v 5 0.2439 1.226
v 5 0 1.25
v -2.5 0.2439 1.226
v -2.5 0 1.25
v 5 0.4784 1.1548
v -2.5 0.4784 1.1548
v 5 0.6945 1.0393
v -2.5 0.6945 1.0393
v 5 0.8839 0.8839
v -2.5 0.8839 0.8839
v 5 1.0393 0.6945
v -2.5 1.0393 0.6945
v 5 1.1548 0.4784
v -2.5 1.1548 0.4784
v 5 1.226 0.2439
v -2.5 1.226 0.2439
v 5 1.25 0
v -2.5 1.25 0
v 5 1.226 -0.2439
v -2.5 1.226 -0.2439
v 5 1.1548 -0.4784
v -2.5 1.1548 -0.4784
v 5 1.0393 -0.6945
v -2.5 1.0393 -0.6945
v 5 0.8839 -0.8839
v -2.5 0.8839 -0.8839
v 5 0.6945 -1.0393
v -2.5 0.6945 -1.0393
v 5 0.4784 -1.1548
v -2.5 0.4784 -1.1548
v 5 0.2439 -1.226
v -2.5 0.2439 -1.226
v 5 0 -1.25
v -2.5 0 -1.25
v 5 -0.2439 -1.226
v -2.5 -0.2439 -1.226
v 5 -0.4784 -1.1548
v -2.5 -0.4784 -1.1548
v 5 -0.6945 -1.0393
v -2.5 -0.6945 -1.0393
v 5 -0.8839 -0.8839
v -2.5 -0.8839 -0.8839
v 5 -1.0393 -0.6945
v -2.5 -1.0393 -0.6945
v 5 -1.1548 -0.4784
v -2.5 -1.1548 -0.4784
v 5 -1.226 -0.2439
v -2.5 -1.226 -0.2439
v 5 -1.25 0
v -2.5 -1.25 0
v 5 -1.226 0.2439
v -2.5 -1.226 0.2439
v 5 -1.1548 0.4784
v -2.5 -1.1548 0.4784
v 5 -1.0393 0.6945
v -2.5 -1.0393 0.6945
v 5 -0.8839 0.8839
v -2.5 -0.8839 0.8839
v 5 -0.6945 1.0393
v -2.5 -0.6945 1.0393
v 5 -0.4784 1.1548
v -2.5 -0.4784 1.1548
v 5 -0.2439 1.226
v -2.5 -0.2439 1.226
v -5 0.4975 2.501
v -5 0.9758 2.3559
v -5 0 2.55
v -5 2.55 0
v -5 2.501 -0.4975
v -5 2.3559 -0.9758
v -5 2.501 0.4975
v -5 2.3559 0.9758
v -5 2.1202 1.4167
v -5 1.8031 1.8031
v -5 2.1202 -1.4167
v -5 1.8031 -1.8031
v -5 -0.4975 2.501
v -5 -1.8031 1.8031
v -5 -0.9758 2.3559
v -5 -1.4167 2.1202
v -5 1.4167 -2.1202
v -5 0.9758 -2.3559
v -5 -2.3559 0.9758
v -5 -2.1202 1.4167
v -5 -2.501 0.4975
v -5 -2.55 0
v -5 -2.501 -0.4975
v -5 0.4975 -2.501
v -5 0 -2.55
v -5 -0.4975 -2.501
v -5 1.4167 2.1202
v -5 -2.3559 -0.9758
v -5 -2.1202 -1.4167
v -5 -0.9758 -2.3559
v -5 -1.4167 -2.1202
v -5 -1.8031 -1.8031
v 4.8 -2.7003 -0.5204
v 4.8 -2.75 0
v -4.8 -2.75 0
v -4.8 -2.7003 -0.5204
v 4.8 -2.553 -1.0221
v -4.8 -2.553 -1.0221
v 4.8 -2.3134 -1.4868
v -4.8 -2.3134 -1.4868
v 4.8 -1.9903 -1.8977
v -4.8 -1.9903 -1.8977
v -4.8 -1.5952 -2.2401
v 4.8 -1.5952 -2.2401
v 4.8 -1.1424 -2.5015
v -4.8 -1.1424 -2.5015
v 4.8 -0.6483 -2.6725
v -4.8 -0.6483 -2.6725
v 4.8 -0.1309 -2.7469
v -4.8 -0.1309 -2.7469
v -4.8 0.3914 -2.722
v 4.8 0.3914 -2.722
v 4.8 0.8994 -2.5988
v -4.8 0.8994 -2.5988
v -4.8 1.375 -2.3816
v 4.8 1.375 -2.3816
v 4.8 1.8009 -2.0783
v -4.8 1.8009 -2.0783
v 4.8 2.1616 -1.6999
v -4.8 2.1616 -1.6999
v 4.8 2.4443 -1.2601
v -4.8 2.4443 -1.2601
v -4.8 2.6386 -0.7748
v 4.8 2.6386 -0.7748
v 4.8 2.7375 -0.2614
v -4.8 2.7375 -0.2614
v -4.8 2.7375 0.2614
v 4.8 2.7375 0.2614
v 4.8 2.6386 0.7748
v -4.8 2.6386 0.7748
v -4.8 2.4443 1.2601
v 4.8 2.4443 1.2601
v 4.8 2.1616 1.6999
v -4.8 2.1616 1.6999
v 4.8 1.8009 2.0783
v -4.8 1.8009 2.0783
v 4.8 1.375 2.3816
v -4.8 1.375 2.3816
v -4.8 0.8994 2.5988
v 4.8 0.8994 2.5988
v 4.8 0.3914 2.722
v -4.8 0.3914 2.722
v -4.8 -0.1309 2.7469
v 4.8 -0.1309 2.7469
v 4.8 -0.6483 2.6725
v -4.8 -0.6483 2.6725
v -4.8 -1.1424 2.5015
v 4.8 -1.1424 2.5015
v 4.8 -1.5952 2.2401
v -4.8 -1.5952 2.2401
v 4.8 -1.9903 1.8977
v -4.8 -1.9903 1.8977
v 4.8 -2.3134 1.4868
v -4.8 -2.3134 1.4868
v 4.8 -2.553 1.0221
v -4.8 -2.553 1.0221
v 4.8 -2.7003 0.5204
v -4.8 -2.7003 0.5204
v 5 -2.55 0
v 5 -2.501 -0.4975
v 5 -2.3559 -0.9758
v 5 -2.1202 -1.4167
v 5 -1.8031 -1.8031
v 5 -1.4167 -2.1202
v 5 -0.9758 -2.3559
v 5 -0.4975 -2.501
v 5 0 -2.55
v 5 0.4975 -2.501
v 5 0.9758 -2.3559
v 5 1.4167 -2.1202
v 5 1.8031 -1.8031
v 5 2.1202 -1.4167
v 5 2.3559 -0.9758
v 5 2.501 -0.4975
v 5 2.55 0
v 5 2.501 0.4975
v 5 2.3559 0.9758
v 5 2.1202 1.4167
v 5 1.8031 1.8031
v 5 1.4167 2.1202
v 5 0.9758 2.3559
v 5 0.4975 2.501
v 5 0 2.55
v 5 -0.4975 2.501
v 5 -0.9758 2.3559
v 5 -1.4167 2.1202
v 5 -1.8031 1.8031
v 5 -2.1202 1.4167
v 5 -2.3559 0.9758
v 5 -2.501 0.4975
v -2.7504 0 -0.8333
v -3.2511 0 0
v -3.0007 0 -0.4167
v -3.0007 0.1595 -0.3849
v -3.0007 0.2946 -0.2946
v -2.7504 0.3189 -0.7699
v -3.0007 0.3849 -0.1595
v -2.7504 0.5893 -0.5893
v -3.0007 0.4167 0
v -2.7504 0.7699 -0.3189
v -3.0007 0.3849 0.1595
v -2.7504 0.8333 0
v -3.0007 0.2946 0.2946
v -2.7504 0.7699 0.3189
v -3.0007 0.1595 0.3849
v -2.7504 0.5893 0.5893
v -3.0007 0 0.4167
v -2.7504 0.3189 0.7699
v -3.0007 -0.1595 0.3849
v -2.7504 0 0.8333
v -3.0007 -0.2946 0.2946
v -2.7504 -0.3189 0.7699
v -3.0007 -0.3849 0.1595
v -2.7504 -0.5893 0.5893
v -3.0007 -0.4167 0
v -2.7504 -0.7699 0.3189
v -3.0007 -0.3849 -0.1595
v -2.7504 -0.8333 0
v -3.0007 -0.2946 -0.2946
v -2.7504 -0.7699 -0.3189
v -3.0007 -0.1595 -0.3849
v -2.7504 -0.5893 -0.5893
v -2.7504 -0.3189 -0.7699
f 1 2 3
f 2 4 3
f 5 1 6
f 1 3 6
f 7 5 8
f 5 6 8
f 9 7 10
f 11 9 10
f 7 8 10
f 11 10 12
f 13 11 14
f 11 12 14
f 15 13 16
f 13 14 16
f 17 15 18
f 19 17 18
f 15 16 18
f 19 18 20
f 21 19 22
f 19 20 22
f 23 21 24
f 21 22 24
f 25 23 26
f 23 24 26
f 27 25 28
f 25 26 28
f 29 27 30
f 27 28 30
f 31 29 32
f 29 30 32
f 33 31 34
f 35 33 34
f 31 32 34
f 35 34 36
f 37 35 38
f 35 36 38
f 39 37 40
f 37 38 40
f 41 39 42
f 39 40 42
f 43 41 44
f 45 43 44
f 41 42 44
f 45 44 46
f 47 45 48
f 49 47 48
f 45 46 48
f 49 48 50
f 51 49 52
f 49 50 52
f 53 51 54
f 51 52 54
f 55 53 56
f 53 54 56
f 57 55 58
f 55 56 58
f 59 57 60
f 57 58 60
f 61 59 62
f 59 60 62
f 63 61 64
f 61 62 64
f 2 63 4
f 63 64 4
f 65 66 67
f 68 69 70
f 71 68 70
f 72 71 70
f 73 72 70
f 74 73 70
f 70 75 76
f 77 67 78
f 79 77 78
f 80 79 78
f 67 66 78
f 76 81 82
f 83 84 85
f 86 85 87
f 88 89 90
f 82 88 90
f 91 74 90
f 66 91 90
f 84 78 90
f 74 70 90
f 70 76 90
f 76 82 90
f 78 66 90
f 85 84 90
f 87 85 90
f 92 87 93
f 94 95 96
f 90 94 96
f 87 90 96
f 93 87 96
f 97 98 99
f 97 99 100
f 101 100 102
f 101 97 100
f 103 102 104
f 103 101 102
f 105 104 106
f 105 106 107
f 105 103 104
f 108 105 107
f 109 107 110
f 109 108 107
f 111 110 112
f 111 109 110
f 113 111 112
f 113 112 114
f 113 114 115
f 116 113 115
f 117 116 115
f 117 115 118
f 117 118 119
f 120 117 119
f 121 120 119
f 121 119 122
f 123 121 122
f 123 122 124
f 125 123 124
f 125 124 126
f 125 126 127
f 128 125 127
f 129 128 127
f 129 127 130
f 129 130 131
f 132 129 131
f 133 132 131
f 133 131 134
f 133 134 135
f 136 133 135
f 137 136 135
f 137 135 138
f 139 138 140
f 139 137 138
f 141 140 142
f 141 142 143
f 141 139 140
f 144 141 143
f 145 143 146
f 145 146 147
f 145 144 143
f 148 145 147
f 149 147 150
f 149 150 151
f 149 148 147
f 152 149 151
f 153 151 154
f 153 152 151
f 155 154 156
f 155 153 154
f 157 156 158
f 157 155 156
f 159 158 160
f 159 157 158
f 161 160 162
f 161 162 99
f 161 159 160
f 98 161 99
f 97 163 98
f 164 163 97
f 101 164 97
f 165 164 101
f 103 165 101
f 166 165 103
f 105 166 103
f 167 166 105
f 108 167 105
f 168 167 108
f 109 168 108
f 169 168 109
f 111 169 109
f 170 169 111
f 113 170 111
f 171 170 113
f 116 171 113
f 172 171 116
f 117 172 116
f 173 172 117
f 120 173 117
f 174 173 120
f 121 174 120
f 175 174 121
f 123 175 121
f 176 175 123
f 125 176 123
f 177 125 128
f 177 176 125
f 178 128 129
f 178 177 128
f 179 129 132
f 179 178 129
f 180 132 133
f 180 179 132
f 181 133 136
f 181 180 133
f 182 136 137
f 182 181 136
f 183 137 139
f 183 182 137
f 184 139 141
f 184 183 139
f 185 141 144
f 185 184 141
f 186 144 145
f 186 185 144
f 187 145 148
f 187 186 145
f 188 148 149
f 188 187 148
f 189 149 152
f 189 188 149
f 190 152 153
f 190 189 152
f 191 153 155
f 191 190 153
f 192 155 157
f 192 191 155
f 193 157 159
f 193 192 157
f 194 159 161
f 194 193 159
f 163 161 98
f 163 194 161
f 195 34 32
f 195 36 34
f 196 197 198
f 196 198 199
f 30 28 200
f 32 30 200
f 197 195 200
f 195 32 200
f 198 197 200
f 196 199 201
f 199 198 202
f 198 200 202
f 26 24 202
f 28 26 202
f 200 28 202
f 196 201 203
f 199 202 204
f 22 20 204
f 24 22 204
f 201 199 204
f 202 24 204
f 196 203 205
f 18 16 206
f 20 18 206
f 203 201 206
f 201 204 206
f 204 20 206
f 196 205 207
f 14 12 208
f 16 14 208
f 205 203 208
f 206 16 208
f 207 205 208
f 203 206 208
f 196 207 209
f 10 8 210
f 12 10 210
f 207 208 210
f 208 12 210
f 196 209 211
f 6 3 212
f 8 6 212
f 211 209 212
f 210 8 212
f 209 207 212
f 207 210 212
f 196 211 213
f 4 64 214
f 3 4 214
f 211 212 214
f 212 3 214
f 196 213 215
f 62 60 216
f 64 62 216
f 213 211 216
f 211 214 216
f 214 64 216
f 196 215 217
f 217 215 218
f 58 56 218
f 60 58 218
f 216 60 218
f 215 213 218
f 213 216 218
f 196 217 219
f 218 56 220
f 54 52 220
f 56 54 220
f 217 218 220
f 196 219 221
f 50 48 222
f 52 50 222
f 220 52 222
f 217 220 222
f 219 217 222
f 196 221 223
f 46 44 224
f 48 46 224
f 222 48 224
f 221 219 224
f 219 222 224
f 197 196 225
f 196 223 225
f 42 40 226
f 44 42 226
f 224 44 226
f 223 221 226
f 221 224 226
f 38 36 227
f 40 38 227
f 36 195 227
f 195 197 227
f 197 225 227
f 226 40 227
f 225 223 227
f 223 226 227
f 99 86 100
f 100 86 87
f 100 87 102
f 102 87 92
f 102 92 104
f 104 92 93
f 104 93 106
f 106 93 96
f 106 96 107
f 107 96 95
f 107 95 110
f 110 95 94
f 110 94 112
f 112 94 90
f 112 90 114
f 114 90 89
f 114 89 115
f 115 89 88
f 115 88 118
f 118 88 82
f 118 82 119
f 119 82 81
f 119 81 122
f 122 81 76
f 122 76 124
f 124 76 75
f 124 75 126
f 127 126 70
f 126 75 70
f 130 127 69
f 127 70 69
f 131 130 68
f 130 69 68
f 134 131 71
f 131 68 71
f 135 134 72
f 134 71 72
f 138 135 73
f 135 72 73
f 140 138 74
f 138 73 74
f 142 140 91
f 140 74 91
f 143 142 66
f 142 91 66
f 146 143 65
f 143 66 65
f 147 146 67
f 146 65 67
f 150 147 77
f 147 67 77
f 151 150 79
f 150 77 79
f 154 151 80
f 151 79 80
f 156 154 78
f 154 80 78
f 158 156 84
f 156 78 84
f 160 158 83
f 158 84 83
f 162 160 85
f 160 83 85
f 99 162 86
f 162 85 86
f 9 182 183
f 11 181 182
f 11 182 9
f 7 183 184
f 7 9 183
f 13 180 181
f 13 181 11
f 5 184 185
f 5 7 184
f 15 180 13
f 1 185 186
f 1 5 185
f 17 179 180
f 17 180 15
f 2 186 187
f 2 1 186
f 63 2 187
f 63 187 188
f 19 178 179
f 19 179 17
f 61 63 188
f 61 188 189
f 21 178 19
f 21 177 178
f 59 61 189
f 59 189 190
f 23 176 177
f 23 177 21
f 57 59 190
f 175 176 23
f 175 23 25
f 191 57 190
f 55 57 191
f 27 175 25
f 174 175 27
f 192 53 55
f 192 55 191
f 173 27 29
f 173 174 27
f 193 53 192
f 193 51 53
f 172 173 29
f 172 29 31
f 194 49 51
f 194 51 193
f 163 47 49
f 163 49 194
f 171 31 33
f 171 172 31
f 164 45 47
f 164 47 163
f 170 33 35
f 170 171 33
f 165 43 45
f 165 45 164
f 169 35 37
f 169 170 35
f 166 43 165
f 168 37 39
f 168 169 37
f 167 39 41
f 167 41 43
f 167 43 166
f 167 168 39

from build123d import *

# Parameters (mm, degrees)
SKETCH1_R                 = 2.75
BOSS_EXTRUDE1_DEPTH       = 5
CHAMFER1_SIZE             = 0.2
M3X0_5_TAPPED_HOLE1_D     = 2.5
M3X0_5_TAPPED_HOLE1_DEPTH = 7.5
M3X0_5_TAPPED_HOLE1_TIP   = 0.751075774


with BuildPart() as part:
    # Sketch1 → Boss-Extrude1 (new body, symmetric)
    with BuildSketch(Plane(origin=(0, 0, 0), x_dir=(0, -1, 0), z_dir=(1, 0, 0))):
        Circle(SKETCH1_R)
    extrude(amount=BOSS_EXTRUDE1_DEPTH, both=True)

    # Chamfer1
    chamfer1_edges = [part.edges().sort_by_distance(p)[0] for p in [
        (-5, 2.75, 0),
        (5, 2.75, 0),
    ]]
    chamfer(chamfer1_edges, length=CHAMFER1_SIZE)

    # M3x0.5 Tapped Hole1
    with Locations(Plane(origin=(5, 0, 0), x_dir=(0, 0, -1), z_dir=(1, 0, 0))):
        with Locations((0, 0)):
            Hole(M3X0_5_TAPPED_HOLE1_D / 2, depth=M3X0_5_TAPPED_HOLE1_DEPTH)
            with Locations((0, 0, -(M3X0_5_TAPPED_HOLE1_DEPTH + M3X0_5_TAPPED_HOLE1_TIP / 2))):  # 118° drill point
                Cone(0, M3X0_5_TAPPED_HOLE1_D / 2, M3X0_5_TAPPED_HOLE1_TIP, mode=Mode.SUBTRACT)


solid = part.part
